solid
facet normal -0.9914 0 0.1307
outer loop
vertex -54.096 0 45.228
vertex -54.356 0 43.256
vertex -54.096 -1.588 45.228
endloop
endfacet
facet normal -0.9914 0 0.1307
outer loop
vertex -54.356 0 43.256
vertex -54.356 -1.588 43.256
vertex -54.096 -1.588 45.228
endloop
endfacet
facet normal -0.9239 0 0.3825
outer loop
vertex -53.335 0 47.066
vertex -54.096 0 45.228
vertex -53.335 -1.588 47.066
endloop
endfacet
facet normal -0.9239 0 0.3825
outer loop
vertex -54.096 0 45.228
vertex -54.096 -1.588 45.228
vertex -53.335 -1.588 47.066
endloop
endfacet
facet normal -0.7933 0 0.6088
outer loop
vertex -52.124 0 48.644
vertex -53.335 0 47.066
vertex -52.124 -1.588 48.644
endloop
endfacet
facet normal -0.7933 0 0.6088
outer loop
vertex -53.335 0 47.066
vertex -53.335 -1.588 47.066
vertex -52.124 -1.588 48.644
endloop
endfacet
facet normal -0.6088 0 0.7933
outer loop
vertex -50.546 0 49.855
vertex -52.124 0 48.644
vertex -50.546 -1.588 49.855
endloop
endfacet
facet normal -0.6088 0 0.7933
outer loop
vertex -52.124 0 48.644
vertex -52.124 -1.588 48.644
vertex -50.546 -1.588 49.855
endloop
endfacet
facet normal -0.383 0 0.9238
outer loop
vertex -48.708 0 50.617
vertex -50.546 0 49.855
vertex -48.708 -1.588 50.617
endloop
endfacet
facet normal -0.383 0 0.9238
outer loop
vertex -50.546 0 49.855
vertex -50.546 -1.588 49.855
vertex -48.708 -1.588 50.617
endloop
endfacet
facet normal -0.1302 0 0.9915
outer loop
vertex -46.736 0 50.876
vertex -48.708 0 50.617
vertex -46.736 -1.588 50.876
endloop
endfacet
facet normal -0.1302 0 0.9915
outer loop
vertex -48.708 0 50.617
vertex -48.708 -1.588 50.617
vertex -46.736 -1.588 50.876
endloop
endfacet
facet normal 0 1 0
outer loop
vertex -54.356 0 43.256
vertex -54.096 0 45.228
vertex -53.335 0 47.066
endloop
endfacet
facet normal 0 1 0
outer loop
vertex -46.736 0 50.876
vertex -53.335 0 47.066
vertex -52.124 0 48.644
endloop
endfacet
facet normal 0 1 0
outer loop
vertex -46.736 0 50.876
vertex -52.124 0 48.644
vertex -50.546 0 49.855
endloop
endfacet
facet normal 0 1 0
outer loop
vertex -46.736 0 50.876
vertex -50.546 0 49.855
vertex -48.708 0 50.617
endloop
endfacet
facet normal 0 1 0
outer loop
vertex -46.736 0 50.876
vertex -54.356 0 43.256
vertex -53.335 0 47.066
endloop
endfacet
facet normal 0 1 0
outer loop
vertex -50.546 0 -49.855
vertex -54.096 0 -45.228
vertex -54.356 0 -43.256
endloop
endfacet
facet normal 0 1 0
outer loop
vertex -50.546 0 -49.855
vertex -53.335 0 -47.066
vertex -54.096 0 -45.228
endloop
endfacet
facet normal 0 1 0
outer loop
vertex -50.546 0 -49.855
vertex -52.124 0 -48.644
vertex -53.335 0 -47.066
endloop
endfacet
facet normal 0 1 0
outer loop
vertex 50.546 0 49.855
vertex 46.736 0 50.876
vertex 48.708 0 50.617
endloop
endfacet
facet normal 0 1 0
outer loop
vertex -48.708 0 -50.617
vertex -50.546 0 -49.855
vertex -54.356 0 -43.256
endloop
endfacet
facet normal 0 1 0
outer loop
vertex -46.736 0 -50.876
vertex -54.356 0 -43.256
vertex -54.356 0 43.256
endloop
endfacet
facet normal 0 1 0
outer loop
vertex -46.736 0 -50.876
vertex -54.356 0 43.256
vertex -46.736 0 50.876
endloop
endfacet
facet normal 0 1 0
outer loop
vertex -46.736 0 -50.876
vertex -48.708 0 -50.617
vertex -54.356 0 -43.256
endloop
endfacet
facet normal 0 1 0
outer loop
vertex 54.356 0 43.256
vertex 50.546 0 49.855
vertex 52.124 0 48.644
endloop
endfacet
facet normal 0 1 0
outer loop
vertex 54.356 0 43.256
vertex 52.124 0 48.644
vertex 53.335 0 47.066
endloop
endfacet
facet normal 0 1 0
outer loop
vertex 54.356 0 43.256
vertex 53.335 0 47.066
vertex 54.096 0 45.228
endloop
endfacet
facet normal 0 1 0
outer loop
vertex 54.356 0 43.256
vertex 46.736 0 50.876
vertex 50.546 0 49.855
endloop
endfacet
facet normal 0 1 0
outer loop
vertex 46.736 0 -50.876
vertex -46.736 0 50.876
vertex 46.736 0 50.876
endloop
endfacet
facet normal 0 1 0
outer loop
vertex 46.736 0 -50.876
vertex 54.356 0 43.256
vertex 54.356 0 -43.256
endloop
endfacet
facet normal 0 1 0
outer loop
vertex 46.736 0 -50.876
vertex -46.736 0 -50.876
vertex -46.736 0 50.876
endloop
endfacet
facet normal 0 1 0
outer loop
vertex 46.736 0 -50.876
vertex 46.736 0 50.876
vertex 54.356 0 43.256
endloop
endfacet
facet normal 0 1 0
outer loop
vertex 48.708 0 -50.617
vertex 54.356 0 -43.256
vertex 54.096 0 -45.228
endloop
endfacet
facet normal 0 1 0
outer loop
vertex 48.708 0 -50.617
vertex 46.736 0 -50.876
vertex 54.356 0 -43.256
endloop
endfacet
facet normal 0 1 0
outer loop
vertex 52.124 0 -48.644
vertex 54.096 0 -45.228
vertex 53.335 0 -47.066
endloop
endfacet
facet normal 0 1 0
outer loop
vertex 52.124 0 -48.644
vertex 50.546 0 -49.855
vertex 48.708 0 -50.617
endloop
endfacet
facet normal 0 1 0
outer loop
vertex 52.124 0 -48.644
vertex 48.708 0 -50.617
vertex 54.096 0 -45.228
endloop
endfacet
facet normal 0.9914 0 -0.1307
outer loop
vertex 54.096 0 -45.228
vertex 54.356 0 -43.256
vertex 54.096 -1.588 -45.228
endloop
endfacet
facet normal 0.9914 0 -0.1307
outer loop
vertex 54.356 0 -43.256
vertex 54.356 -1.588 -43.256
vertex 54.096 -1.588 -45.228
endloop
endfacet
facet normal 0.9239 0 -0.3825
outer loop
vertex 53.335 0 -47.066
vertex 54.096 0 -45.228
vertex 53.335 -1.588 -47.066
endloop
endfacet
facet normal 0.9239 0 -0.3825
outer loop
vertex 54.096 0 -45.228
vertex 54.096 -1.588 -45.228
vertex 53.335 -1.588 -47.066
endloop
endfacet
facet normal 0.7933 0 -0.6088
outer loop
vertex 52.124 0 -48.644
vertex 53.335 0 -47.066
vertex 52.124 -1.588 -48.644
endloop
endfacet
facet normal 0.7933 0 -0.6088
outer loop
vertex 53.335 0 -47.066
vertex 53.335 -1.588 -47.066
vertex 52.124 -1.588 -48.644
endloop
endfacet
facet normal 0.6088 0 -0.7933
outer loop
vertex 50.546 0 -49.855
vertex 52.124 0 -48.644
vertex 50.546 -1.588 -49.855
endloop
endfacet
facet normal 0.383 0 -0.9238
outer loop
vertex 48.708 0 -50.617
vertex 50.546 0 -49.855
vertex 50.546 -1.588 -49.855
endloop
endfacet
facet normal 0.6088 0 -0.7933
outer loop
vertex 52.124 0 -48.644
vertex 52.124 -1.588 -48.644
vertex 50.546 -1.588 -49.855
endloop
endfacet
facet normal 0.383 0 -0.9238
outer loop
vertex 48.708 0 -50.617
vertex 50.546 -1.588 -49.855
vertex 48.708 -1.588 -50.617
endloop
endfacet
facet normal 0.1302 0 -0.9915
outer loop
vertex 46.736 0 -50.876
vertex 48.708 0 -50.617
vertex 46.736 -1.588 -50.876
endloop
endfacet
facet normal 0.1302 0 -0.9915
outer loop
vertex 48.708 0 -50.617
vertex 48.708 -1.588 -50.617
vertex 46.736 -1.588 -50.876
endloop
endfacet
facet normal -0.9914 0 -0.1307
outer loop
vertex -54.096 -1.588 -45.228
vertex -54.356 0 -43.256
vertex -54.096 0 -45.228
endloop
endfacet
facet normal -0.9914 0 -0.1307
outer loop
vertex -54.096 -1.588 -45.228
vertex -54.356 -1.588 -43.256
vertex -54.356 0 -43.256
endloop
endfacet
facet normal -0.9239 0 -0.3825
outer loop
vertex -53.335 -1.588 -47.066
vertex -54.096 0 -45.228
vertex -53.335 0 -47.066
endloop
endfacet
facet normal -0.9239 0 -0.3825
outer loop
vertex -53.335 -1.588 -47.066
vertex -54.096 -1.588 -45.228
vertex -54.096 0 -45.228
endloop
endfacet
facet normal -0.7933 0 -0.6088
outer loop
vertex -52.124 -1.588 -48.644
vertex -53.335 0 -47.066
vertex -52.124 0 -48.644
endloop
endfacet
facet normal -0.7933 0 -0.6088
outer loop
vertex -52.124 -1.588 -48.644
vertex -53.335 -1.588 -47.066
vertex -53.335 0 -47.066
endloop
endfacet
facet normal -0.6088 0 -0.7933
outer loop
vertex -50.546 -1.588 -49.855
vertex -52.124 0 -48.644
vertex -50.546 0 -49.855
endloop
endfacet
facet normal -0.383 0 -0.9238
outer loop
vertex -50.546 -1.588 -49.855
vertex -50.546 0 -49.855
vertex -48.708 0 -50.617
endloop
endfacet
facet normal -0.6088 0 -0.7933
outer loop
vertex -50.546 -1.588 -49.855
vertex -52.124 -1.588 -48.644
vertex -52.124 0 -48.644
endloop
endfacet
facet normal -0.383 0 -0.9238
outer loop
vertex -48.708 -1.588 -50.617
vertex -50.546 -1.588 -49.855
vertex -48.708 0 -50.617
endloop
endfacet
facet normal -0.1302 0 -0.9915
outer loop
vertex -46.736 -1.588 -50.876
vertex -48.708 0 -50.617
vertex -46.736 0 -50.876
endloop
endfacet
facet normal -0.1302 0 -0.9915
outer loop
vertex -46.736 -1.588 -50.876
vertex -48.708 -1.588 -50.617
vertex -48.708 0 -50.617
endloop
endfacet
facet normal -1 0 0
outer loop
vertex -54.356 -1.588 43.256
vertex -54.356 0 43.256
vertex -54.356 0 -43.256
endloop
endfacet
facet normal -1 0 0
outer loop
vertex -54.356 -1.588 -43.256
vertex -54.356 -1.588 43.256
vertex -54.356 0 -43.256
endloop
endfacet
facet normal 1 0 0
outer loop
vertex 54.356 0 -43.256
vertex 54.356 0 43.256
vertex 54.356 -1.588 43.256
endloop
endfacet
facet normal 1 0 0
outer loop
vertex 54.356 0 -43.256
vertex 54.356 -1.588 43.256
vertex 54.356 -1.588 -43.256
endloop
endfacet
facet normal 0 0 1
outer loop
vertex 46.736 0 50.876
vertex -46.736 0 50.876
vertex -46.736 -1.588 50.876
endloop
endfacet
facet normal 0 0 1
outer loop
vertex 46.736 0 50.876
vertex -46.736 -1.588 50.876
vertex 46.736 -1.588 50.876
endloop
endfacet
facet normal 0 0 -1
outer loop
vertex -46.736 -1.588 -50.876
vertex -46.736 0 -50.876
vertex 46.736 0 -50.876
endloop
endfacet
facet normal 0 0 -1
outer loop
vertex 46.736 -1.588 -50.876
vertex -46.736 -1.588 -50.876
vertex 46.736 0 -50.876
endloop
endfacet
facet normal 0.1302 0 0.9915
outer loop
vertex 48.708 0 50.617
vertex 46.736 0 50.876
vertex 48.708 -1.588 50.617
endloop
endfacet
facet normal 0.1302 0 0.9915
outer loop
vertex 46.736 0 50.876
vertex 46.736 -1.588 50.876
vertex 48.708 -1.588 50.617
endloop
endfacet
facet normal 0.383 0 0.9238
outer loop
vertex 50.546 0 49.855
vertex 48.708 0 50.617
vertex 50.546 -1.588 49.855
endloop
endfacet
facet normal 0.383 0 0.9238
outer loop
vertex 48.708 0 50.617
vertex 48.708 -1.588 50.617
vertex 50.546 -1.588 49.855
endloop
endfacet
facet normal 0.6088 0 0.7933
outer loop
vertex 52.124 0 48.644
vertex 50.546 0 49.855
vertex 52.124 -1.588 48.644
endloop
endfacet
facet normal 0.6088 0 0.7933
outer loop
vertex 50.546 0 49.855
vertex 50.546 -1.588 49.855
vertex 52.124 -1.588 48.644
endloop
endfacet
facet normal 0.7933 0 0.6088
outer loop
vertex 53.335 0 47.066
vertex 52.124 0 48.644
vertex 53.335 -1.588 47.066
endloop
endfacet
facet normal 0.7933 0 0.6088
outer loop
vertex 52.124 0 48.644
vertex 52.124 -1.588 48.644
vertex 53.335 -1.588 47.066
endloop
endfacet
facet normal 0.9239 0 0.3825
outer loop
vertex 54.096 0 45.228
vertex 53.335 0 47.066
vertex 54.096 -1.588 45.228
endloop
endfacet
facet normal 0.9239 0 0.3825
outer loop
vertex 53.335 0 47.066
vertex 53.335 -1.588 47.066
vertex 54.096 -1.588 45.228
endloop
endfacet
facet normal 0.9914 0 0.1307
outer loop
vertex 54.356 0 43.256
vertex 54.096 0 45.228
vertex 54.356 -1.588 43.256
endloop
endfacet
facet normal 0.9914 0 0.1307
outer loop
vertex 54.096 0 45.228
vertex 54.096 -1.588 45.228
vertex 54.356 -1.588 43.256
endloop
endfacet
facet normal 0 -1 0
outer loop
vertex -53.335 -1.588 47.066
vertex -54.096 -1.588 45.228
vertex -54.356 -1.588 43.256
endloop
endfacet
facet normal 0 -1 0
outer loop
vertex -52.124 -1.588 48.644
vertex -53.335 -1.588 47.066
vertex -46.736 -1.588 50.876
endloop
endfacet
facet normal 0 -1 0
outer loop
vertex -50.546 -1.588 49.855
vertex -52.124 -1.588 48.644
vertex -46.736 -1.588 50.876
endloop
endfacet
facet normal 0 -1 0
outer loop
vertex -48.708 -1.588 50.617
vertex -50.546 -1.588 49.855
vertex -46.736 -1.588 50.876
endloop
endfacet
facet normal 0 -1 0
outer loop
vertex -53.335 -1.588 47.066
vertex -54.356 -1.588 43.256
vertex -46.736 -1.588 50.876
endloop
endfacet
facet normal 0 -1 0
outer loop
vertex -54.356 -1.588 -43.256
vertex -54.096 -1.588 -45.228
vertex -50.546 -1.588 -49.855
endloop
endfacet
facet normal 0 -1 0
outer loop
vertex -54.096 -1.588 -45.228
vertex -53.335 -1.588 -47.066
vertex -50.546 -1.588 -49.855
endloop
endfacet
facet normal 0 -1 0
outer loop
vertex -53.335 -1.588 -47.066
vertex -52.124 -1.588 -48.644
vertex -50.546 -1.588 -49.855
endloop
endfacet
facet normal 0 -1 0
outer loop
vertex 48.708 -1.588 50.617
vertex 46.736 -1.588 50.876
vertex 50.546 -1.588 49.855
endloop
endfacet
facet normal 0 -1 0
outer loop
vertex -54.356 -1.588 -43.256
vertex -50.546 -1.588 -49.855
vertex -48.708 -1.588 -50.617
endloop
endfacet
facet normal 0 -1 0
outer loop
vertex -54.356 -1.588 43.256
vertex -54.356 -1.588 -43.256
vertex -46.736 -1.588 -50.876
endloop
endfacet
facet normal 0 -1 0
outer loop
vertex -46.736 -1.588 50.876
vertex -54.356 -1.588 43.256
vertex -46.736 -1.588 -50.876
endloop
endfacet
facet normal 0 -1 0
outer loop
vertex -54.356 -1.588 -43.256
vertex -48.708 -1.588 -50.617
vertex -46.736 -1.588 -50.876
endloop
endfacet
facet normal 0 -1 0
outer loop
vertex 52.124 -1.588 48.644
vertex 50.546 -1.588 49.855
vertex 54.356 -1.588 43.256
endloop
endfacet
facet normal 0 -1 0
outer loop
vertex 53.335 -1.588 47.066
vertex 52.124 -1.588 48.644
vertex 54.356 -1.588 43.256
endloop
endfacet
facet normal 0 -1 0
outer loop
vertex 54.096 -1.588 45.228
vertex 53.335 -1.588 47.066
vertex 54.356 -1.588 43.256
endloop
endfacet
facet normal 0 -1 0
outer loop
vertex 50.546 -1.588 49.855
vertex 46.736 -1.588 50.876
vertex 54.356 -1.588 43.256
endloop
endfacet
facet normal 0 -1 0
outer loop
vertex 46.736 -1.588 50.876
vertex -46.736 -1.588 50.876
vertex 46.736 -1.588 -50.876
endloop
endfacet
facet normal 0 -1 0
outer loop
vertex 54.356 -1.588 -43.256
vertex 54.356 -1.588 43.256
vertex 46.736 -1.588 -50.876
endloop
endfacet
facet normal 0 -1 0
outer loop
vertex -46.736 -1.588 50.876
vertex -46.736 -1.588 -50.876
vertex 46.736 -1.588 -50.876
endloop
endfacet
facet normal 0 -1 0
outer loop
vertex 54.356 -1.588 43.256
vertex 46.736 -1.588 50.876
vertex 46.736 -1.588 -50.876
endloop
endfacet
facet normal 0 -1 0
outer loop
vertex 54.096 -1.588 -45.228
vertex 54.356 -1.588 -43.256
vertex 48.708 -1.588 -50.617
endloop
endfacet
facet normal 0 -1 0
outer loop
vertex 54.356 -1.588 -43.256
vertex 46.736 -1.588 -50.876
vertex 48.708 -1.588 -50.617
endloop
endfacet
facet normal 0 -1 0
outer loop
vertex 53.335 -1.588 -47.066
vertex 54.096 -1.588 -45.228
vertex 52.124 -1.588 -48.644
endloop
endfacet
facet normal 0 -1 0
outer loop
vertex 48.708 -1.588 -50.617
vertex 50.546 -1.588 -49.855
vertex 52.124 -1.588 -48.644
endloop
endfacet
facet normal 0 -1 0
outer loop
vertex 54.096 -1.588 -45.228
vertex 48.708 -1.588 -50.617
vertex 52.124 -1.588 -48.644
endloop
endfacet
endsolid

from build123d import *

# Parameters (mm, degrees)
SKETCH1_W           = 108.712
SKETCH1_H           = 101.7524
BOSS_EXTRUDE1_DEPTH = 1.5875
FILLET1_R           = 7.62


with BuildPart() as part:
    # Sketch1 → Boss-Extrude1 (new body)
    with BuildSketch(Plane(origin=(0, 0, 0), x_dir=(1, 0, 0), z_dir=(0, 1, 0))):
        Rectangle(SKETCH1_W, SKETCH1_H)
    extrude(amount=-BOSS_EXTRUDE1_DEPTH)

    # Fillet1
    fillet1_edges = [part.edges().sort_by_distance(p)[0] for p in [
        (-54.356, -0.79375, -50.8762),
        (54.356, -0.79375, -50.8762),
        (54.356, -0.79375, 50.8762),
        (-54.356, -0.79375, 50.8762),
    ]]
    fillet(fillet1_edges, radius=FILLET1_R)


solid = part.part
